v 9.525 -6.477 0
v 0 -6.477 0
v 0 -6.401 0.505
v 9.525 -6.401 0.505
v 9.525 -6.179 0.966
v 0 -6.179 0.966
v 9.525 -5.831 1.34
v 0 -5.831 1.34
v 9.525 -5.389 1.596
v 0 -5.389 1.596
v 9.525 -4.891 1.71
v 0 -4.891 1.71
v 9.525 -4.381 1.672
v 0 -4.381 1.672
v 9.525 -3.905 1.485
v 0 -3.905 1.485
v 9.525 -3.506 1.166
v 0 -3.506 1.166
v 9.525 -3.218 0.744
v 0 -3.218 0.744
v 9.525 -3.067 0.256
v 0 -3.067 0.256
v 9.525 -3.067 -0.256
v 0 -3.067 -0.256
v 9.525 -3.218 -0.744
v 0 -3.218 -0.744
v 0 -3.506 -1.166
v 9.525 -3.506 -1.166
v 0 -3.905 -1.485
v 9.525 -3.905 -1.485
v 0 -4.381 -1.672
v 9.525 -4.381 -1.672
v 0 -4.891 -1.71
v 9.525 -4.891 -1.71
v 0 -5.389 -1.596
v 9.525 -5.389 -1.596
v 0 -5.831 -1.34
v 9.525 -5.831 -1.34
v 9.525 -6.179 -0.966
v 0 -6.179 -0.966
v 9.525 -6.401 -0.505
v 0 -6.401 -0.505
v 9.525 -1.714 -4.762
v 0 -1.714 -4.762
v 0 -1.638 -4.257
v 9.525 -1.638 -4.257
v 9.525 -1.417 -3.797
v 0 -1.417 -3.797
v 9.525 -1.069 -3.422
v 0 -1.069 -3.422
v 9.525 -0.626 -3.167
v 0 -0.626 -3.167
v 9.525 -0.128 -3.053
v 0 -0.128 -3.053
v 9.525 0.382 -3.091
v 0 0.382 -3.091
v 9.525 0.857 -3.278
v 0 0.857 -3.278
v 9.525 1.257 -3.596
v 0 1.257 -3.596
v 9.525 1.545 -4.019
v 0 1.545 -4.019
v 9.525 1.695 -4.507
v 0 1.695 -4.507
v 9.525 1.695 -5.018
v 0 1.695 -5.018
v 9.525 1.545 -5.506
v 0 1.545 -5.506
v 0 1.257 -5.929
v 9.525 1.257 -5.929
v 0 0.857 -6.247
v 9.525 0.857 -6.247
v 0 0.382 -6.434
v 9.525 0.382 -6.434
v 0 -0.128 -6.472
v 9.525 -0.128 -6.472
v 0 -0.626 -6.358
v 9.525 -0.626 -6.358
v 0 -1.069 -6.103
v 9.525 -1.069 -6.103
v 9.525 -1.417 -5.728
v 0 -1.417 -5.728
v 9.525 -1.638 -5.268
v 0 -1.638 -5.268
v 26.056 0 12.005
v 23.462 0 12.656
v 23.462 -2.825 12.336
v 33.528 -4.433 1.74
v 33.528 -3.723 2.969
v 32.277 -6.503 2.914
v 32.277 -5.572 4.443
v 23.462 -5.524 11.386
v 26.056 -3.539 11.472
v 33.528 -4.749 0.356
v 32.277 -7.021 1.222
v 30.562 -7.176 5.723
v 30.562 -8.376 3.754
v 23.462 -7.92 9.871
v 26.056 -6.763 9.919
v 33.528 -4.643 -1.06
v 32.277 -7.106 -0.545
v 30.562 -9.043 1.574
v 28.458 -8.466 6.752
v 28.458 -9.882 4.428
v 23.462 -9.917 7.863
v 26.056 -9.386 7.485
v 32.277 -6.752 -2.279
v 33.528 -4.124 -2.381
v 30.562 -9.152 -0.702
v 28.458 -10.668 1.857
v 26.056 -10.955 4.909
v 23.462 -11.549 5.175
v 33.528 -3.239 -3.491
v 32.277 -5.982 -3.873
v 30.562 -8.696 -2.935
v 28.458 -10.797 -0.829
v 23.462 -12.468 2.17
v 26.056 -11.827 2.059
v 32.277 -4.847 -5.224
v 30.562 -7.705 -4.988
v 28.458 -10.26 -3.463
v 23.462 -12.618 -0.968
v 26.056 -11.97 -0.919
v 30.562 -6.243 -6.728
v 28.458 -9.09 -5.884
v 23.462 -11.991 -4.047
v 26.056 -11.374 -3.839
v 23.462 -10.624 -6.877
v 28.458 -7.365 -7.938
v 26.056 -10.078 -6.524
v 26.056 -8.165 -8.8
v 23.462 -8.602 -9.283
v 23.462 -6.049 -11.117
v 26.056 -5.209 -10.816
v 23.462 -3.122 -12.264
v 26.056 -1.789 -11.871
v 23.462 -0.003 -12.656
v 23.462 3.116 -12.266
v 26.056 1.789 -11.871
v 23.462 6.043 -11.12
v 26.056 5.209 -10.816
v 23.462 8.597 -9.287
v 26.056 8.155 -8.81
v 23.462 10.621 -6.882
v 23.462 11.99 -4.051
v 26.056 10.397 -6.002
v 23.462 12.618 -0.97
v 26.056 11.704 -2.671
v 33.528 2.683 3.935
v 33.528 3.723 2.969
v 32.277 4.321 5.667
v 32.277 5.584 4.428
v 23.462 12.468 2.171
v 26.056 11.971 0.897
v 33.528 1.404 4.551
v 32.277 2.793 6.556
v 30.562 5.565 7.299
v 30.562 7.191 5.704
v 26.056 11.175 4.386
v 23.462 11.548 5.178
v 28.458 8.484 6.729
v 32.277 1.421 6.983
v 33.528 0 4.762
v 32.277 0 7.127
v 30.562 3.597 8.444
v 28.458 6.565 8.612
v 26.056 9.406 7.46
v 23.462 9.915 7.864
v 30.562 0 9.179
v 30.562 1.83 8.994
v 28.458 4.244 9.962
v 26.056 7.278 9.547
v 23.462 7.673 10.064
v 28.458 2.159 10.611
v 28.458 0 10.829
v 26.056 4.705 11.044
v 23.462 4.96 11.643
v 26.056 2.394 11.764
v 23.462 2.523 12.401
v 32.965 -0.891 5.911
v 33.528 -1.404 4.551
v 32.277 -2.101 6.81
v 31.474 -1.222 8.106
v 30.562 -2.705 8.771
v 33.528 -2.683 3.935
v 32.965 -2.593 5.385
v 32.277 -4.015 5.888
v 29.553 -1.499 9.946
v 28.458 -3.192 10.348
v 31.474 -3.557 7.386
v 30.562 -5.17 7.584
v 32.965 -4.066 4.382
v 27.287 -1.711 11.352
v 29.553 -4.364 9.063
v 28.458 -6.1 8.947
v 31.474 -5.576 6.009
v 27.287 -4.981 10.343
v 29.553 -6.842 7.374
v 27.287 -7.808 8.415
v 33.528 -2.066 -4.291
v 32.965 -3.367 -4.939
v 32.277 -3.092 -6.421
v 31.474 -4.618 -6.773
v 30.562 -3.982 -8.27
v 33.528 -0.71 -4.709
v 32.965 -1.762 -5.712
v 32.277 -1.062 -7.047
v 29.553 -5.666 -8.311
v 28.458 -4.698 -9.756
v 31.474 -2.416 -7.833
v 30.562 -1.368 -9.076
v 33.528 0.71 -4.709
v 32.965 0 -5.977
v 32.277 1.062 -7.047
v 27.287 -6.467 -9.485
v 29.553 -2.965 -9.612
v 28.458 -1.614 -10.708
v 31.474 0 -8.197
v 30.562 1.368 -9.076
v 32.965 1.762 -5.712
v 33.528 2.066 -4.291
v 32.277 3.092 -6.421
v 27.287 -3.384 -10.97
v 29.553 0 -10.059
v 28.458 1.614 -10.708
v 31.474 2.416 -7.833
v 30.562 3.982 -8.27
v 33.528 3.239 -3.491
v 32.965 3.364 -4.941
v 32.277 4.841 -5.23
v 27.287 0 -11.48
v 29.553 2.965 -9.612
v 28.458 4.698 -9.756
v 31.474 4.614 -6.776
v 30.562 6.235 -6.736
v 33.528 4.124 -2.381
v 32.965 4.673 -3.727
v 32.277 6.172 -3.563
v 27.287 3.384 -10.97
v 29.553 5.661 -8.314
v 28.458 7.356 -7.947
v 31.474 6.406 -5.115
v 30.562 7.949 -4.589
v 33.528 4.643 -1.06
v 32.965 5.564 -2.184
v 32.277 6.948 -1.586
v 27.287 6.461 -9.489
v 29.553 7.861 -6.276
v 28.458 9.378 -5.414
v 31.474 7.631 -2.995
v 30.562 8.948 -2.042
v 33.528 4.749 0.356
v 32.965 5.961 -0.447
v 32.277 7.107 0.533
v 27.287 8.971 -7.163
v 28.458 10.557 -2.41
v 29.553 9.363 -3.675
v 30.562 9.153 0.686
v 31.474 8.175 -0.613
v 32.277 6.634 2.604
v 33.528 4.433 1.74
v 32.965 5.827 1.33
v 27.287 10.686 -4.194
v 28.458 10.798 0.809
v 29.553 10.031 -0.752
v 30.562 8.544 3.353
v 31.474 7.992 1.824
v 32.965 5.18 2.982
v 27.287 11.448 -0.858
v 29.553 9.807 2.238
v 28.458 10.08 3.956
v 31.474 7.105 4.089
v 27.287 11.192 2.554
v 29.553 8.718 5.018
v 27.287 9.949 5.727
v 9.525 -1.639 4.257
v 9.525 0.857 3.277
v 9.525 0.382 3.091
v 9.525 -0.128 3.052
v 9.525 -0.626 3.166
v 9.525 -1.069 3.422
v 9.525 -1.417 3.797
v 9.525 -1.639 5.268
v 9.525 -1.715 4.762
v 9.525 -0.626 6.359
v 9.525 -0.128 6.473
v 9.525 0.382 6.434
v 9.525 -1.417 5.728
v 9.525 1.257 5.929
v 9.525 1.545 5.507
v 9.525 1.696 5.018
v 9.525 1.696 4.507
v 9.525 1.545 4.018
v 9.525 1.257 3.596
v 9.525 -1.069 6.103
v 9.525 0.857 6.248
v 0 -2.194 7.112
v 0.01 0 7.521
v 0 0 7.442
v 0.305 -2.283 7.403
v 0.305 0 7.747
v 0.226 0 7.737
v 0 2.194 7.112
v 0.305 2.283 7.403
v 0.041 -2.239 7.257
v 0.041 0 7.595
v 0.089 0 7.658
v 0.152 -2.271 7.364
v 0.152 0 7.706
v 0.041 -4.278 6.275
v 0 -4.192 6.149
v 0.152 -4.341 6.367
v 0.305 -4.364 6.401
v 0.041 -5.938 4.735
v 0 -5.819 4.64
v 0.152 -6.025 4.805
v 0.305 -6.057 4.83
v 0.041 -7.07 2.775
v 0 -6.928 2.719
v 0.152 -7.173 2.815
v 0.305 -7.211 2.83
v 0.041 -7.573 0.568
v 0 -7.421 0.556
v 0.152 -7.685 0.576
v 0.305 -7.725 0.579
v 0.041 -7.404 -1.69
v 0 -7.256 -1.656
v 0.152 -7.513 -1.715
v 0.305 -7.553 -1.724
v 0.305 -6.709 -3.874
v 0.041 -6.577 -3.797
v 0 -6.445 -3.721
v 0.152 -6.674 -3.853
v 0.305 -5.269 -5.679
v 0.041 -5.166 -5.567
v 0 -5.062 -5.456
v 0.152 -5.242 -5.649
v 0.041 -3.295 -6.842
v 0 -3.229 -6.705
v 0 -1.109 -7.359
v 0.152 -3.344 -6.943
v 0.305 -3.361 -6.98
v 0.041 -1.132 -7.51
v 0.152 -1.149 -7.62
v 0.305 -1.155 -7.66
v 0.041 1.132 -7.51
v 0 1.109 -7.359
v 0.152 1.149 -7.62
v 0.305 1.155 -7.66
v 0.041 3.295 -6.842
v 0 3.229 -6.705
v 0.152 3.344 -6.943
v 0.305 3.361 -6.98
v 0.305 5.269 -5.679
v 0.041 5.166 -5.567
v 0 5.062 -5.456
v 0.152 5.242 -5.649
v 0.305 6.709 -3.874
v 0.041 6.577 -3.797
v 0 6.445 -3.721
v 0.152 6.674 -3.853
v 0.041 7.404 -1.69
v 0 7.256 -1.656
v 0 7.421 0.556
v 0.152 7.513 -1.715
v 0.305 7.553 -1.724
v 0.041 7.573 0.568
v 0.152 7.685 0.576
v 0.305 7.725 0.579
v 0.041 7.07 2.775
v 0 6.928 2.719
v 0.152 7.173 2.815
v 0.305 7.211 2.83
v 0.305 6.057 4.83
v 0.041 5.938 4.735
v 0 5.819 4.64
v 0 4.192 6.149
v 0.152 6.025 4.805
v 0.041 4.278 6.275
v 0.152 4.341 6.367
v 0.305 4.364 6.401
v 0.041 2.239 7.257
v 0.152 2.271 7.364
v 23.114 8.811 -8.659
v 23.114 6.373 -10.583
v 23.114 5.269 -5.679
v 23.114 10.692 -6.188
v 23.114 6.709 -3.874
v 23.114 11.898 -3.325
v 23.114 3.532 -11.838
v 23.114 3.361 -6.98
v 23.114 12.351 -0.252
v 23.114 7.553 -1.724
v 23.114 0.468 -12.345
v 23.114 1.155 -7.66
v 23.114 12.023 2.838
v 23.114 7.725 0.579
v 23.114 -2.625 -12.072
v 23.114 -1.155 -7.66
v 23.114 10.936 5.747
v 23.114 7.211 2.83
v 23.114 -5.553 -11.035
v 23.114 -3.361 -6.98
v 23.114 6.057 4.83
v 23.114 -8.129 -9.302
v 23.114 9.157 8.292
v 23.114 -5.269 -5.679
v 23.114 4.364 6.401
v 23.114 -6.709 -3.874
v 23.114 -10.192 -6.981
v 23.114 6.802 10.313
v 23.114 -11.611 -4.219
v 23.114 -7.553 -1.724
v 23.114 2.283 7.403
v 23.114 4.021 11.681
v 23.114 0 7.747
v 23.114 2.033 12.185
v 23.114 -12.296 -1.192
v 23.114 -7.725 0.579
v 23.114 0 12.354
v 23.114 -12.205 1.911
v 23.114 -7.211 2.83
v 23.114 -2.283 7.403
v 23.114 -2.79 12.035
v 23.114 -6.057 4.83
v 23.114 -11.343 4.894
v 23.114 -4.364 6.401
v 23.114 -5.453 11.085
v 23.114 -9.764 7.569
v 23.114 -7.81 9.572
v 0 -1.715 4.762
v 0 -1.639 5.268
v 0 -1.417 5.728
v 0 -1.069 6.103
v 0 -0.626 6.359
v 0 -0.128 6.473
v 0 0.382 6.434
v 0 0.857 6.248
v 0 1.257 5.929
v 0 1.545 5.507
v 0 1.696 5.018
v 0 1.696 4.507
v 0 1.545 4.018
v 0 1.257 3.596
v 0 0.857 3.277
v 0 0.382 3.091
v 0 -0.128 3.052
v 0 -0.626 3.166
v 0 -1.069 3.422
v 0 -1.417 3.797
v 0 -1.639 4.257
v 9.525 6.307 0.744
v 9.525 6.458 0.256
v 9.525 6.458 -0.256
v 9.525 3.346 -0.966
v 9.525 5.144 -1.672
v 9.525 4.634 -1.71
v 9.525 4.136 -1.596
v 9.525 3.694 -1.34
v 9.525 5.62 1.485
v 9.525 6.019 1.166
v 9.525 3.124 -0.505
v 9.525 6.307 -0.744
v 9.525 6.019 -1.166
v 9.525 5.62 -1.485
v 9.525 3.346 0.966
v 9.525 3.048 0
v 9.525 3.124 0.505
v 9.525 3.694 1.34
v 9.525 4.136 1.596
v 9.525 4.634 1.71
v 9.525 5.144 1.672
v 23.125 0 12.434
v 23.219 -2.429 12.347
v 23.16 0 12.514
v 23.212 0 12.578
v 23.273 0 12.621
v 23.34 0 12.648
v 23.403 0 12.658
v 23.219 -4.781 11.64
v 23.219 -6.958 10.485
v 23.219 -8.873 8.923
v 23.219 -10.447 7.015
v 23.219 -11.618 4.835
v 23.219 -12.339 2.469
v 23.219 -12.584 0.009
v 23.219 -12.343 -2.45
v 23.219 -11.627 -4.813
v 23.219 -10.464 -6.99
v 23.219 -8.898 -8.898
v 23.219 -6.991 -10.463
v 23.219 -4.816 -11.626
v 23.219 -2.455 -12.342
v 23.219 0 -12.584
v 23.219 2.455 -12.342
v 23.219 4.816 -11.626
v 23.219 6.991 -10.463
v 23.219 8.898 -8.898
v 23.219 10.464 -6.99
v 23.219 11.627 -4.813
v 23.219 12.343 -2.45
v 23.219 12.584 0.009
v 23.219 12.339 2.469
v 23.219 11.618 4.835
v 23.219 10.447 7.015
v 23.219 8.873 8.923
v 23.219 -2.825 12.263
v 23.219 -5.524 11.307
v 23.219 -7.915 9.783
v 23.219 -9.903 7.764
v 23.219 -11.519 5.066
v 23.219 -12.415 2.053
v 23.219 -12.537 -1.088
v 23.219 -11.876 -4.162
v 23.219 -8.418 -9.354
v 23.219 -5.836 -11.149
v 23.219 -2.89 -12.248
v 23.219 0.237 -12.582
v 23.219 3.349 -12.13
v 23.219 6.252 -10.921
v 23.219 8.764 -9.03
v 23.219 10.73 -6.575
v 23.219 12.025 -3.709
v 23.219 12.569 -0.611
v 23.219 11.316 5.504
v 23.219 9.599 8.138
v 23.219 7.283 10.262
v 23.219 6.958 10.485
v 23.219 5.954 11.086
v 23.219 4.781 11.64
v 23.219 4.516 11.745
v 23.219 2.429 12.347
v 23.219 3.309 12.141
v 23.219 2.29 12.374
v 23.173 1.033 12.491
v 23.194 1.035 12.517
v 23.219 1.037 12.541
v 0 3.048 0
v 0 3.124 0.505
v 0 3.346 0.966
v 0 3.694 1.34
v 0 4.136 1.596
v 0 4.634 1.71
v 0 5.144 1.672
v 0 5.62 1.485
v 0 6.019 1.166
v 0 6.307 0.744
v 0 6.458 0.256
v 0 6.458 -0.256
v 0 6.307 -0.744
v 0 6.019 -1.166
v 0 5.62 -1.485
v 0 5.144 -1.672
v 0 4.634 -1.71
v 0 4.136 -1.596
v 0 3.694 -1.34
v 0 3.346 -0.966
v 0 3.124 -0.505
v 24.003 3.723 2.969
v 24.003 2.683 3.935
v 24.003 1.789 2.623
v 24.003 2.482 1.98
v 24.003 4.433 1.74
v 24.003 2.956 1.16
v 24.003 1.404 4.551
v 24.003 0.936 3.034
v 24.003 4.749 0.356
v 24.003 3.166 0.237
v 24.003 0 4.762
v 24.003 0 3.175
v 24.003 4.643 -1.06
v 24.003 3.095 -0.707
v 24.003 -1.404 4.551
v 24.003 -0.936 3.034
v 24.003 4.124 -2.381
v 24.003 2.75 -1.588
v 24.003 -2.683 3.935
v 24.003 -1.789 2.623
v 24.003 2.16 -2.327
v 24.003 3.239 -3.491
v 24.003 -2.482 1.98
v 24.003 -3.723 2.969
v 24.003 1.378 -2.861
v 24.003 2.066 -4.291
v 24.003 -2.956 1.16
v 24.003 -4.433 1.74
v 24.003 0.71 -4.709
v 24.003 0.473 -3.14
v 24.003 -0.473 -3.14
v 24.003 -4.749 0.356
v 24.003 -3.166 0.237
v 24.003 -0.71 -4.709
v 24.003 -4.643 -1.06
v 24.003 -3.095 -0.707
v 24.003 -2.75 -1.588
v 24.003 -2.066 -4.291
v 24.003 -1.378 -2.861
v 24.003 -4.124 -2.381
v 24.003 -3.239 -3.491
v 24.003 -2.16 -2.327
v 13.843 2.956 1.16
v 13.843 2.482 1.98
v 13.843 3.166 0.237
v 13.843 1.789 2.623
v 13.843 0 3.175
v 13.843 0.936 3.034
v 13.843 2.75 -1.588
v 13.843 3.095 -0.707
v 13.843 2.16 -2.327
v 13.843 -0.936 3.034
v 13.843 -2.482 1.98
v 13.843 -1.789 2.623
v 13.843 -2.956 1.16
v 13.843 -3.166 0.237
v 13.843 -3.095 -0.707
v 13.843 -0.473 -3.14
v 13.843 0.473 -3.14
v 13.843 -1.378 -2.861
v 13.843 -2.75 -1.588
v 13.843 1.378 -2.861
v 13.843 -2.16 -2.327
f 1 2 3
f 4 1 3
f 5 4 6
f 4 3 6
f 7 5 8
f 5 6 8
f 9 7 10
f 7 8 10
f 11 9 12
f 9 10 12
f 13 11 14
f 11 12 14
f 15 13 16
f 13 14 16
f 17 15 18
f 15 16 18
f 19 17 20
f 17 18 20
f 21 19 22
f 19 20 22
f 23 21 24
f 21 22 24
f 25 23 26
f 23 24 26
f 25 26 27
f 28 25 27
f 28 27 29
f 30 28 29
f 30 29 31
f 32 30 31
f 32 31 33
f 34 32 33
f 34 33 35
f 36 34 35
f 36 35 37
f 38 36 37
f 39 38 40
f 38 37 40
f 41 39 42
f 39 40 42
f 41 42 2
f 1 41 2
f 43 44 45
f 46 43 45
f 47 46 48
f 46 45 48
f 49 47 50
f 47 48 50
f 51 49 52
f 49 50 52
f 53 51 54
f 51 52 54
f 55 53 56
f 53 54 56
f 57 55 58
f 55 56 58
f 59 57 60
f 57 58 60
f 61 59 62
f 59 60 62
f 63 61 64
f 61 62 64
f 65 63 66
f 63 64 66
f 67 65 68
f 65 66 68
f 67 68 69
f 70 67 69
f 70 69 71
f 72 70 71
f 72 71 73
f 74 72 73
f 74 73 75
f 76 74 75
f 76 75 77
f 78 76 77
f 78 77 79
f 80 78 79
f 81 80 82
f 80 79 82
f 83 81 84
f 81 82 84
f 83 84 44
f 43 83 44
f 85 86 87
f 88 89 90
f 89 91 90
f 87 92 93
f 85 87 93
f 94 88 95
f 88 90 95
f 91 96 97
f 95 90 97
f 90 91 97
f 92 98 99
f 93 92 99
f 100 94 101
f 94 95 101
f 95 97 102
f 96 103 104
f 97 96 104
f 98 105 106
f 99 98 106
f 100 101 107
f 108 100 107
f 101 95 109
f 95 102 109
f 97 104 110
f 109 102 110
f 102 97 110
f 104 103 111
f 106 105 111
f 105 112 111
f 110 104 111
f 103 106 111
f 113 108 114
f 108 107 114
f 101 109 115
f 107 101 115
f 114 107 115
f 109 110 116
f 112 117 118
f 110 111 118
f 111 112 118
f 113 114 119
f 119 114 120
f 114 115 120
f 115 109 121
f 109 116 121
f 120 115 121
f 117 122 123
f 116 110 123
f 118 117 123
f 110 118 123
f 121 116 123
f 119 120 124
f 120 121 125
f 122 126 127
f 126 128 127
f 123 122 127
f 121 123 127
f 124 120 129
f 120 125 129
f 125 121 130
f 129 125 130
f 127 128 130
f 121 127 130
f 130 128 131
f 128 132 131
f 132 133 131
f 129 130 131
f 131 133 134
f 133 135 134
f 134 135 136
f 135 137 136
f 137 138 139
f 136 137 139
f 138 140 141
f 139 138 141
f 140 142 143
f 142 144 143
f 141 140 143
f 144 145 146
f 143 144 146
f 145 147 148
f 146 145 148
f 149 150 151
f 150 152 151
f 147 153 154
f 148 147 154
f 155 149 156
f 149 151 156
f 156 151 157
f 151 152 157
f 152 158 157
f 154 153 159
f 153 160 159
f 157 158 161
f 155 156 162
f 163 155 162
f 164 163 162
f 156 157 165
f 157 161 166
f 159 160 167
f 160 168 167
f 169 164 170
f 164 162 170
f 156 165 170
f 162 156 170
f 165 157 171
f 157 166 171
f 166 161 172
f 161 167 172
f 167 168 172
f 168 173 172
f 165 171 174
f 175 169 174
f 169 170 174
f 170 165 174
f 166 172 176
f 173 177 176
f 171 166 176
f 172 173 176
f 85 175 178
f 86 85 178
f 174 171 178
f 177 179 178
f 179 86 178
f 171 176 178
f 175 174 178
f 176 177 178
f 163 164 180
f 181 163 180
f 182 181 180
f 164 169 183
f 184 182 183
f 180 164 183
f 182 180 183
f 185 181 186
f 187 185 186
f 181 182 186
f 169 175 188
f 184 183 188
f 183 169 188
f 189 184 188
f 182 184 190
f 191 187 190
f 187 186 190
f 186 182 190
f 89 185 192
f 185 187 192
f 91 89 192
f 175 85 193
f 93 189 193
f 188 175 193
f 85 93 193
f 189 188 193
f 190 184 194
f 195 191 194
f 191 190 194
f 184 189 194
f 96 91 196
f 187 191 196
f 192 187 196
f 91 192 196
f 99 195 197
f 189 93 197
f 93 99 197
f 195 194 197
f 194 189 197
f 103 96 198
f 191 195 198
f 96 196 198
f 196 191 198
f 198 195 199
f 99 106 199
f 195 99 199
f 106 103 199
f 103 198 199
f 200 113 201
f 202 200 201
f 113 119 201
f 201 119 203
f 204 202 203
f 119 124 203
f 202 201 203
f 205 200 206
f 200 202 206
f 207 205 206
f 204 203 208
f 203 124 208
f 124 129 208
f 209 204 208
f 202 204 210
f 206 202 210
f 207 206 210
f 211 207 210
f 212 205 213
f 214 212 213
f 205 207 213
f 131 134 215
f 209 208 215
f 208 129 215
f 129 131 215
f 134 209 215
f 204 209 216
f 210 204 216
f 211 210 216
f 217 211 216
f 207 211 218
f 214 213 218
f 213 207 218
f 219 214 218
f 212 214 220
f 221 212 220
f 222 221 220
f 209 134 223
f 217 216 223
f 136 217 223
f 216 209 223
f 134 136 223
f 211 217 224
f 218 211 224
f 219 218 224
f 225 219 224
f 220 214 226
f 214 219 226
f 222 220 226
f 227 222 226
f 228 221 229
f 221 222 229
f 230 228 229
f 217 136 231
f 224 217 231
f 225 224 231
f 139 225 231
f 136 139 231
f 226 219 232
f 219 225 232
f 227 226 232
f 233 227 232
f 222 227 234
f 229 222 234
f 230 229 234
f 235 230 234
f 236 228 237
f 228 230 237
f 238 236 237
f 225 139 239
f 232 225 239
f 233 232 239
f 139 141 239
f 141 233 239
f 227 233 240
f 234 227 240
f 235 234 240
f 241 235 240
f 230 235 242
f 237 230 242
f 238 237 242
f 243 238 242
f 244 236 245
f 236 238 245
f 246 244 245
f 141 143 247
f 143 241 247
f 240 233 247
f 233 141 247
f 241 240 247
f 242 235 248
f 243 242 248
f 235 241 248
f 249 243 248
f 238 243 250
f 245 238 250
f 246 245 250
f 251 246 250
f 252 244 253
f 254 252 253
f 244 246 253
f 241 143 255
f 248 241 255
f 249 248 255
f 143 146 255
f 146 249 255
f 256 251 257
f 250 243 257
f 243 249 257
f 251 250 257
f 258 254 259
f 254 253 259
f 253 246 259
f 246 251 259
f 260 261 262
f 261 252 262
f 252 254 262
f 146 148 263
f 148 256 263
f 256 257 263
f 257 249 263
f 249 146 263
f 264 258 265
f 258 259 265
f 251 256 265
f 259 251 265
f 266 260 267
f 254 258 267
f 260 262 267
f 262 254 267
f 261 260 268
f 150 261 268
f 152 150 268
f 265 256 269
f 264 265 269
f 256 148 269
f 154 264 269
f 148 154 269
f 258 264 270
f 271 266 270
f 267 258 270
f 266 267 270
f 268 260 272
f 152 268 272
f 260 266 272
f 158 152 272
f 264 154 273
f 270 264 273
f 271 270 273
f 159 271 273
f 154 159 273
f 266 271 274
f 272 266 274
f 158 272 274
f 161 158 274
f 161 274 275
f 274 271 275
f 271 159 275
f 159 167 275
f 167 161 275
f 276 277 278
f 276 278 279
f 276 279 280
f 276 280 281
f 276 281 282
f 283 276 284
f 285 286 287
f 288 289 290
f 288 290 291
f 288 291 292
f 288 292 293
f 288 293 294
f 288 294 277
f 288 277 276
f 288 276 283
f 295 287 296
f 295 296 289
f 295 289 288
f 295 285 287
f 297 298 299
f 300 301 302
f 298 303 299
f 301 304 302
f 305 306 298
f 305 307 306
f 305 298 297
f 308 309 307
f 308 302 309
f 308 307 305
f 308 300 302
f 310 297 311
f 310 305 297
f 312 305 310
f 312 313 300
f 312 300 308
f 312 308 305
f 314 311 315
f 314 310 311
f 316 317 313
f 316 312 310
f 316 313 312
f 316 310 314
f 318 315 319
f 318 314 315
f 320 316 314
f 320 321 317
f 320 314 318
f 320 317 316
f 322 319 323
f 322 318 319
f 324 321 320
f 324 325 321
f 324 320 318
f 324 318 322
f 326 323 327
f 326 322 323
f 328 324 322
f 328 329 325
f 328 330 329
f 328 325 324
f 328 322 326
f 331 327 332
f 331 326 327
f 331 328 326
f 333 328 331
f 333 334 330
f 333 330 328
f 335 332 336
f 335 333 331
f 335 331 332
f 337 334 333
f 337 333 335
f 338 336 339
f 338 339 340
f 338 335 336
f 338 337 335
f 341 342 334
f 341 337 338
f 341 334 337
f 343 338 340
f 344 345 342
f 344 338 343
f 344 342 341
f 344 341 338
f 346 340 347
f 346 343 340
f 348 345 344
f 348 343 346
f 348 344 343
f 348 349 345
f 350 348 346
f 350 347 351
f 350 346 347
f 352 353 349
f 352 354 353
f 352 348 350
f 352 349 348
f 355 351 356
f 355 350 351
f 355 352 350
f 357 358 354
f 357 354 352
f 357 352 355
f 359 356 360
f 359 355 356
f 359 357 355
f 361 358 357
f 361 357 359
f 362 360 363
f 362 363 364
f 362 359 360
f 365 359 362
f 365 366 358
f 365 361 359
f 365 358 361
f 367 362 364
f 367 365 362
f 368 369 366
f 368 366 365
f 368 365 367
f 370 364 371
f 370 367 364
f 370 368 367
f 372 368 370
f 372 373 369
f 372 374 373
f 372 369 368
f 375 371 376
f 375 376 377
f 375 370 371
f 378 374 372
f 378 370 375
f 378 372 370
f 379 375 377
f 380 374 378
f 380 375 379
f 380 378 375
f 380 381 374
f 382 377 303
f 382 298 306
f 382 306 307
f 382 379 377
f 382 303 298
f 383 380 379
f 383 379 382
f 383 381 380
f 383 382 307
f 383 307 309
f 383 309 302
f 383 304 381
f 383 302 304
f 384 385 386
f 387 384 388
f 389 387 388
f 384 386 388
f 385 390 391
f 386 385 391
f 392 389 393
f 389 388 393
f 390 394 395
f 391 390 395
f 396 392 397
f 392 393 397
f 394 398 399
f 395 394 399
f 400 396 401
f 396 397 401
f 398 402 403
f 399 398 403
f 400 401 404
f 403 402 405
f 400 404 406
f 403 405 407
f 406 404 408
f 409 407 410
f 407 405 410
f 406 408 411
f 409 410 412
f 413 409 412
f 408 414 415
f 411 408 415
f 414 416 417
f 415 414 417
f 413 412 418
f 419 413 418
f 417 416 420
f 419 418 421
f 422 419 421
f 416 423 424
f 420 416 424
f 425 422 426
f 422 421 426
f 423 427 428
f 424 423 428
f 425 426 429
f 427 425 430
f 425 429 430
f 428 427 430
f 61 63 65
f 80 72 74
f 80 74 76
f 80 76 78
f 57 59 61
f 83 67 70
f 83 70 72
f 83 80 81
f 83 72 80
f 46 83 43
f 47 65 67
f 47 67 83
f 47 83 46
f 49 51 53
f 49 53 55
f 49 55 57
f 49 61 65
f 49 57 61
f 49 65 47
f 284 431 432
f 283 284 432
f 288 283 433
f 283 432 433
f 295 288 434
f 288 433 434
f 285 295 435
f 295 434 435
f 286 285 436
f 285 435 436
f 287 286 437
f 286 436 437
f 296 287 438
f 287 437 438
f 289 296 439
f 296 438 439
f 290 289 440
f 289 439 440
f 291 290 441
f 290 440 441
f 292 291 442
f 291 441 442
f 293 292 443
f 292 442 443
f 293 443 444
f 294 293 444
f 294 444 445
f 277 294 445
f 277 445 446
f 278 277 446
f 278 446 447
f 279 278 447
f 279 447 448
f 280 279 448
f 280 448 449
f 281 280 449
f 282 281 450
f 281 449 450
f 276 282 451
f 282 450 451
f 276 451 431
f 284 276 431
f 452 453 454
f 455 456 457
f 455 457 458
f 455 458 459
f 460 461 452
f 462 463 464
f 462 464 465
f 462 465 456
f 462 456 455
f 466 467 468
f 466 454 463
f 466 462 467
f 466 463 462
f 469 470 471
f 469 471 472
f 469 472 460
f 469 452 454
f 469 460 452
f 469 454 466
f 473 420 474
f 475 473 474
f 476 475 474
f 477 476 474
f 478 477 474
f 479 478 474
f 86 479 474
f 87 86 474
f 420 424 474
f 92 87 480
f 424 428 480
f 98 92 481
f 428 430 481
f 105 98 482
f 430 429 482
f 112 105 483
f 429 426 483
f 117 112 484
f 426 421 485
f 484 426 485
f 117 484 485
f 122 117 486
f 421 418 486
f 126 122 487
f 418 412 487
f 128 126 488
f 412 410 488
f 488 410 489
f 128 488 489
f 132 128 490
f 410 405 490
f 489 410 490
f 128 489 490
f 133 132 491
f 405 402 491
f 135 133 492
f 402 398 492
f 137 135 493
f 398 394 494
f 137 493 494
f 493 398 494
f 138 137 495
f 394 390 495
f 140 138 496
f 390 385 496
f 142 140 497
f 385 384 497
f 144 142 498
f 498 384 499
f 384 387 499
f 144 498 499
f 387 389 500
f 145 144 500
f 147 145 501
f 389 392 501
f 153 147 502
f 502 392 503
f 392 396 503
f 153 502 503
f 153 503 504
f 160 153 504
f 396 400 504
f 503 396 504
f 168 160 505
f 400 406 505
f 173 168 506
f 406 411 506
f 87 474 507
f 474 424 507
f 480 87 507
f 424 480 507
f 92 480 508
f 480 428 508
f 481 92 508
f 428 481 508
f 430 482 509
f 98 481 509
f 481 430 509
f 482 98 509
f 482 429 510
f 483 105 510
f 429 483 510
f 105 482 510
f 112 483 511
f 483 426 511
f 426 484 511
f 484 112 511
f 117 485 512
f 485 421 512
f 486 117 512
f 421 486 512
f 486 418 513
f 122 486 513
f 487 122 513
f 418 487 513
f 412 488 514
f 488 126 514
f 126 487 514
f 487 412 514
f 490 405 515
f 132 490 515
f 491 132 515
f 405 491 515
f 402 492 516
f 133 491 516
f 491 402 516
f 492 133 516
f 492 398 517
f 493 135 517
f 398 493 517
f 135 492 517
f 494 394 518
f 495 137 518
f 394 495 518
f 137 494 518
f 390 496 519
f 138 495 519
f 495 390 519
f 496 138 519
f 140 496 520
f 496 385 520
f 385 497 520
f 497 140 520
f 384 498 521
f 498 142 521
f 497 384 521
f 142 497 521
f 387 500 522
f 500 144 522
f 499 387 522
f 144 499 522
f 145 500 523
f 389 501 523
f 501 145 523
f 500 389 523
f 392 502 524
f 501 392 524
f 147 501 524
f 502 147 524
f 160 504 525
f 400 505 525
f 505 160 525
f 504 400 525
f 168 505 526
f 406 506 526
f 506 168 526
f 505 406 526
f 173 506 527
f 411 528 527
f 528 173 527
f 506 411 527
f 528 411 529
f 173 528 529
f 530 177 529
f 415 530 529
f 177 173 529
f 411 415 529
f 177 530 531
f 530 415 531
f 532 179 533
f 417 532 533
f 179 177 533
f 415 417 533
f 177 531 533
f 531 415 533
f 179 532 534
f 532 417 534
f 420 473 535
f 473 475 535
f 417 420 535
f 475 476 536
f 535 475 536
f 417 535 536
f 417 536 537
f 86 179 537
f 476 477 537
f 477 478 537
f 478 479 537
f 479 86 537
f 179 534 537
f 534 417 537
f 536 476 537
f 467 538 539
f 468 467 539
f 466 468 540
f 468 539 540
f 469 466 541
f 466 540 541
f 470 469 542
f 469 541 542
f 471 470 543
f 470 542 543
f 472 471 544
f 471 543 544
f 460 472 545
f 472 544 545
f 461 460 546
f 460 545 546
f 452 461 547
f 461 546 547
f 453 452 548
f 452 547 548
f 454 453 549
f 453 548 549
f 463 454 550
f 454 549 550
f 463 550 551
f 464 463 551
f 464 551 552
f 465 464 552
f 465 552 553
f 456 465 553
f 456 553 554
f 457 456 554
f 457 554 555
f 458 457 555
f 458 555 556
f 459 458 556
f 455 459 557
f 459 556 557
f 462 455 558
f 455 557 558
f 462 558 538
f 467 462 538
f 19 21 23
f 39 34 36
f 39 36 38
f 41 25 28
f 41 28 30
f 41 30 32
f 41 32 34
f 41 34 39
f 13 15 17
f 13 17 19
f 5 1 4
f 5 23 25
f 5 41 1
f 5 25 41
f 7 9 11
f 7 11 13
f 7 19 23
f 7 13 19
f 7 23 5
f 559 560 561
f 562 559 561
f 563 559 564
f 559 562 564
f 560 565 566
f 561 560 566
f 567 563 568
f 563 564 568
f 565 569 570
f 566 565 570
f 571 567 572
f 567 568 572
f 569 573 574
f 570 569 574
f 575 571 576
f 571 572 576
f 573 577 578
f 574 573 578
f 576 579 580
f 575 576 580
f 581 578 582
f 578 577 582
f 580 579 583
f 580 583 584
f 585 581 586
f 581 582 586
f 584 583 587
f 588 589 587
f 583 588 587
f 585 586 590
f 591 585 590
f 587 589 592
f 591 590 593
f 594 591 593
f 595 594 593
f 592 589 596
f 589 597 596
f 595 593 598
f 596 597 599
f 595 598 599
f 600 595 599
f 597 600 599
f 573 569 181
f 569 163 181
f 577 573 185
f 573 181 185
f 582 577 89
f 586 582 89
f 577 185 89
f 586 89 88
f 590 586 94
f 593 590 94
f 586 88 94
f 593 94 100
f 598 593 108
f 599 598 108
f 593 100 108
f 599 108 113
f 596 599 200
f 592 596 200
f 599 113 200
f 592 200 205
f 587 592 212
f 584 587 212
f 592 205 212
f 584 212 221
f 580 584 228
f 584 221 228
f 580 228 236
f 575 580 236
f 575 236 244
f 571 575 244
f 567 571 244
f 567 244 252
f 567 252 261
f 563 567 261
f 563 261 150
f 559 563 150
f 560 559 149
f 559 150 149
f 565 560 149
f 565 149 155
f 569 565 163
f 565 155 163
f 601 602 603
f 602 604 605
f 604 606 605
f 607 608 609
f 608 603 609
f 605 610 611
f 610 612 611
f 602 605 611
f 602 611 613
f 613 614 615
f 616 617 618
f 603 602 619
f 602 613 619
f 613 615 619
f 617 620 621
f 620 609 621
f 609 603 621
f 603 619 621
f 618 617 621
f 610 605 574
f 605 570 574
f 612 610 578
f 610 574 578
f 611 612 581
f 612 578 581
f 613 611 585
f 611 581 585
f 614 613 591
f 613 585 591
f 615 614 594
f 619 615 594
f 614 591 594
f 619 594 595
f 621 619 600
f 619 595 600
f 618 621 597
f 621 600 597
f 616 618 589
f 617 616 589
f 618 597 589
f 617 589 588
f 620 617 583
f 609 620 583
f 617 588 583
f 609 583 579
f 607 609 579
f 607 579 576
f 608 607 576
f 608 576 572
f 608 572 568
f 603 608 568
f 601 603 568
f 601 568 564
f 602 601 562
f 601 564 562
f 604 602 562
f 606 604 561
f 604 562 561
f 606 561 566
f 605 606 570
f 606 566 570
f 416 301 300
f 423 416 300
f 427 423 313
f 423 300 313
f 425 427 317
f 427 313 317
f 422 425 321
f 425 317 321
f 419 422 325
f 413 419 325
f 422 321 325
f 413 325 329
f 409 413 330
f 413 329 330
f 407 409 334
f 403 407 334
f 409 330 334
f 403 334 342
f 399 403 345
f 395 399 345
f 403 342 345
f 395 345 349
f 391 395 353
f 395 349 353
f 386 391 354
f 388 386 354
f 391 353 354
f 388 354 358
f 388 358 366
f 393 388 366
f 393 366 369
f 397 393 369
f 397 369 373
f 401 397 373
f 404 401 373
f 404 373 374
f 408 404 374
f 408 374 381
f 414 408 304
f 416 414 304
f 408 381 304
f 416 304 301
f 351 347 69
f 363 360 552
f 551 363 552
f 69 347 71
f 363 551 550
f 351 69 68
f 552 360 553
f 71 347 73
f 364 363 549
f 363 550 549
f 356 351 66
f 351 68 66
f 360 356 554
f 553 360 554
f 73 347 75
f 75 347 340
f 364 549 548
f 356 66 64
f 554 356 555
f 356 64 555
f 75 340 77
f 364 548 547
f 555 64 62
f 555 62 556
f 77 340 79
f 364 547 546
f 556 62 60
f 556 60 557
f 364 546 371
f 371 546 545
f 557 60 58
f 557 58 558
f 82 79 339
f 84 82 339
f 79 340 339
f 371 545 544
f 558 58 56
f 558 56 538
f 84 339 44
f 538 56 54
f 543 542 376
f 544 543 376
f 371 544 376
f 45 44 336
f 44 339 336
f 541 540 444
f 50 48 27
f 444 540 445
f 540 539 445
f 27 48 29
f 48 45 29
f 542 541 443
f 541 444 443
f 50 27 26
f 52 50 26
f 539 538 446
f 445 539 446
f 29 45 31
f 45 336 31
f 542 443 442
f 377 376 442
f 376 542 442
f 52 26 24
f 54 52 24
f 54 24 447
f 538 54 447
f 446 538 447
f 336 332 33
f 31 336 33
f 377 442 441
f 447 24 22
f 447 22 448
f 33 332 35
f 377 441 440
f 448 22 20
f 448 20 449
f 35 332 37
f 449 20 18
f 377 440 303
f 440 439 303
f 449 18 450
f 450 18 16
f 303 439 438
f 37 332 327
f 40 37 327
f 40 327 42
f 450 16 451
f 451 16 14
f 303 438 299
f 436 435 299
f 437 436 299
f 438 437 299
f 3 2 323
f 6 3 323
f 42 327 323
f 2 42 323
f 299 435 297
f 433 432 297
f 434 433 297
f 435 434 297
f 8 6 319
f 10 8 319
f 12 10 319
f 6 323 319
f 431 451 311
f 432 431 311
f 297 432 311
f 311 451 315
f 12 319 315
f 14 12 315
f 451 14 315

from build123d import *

# Parameters (mm, degrees)
F2_R     = 1.714819
F2_R_2   = 1.7145
F3_DEPTH = 9.525
F4_R     = 0.3048


with BuildPart() as f1:
    # F0 (on Front) → F1 (revolve)
    with BuildSketch(Plane.XZ):
        with BuildLine():
            Line((0, 7.747), (0, 0))
            Line((0, 0), (13.843, 0))
            Line((13.843, 0), (13.843, 3.175))
            Line((13.843, 3.175), (24.003, 3.175))
            Line((24.003, 3.175), (24.003, 4.7625))
            Line((24.003, 4.7625), (33.528, 4.7625))
            ThreePointArc((33.528, 4.7625), (29.41456, 10.166001), (23.114, 12.7))
            Line((23.114, 12.7), (23.114, 7.747))
            Line((23.114, 7.747), (0, 7.747))
        make_face()
    revolve(axis=Axis((6.9215, 0, 0), (1, 0, 0)))

    # F2 (on face) → F3 (cut)
    with BuildSketch(Plane(origin=(0, 0, 0), x_dir=(0, -1, 0), z_dir=(-1, 0, 0))):
        with Locations((0, 4.7625)):
            Circle(F2_R)
        with Locations((4.7625, 0)):
            Circle(F2_R_2)
        with Locations((0, -4.7625)):
            Circle(F2_R_2)
        with Locations((-4.7625, 0)):
            Circle(F2_R_2)
    extrude(amount=-F3_DEPTH, mode=Mode.SUBTRACT)

    # F4
    f4_edges = [f1.edges().sort_by_distance(p)[0] for p in [
        (0, 0, -7.747),
        (23.114, 0, -12.7),
    ]]
    fillet(f4_edges, radius=F4_R)


solid = f1.part
